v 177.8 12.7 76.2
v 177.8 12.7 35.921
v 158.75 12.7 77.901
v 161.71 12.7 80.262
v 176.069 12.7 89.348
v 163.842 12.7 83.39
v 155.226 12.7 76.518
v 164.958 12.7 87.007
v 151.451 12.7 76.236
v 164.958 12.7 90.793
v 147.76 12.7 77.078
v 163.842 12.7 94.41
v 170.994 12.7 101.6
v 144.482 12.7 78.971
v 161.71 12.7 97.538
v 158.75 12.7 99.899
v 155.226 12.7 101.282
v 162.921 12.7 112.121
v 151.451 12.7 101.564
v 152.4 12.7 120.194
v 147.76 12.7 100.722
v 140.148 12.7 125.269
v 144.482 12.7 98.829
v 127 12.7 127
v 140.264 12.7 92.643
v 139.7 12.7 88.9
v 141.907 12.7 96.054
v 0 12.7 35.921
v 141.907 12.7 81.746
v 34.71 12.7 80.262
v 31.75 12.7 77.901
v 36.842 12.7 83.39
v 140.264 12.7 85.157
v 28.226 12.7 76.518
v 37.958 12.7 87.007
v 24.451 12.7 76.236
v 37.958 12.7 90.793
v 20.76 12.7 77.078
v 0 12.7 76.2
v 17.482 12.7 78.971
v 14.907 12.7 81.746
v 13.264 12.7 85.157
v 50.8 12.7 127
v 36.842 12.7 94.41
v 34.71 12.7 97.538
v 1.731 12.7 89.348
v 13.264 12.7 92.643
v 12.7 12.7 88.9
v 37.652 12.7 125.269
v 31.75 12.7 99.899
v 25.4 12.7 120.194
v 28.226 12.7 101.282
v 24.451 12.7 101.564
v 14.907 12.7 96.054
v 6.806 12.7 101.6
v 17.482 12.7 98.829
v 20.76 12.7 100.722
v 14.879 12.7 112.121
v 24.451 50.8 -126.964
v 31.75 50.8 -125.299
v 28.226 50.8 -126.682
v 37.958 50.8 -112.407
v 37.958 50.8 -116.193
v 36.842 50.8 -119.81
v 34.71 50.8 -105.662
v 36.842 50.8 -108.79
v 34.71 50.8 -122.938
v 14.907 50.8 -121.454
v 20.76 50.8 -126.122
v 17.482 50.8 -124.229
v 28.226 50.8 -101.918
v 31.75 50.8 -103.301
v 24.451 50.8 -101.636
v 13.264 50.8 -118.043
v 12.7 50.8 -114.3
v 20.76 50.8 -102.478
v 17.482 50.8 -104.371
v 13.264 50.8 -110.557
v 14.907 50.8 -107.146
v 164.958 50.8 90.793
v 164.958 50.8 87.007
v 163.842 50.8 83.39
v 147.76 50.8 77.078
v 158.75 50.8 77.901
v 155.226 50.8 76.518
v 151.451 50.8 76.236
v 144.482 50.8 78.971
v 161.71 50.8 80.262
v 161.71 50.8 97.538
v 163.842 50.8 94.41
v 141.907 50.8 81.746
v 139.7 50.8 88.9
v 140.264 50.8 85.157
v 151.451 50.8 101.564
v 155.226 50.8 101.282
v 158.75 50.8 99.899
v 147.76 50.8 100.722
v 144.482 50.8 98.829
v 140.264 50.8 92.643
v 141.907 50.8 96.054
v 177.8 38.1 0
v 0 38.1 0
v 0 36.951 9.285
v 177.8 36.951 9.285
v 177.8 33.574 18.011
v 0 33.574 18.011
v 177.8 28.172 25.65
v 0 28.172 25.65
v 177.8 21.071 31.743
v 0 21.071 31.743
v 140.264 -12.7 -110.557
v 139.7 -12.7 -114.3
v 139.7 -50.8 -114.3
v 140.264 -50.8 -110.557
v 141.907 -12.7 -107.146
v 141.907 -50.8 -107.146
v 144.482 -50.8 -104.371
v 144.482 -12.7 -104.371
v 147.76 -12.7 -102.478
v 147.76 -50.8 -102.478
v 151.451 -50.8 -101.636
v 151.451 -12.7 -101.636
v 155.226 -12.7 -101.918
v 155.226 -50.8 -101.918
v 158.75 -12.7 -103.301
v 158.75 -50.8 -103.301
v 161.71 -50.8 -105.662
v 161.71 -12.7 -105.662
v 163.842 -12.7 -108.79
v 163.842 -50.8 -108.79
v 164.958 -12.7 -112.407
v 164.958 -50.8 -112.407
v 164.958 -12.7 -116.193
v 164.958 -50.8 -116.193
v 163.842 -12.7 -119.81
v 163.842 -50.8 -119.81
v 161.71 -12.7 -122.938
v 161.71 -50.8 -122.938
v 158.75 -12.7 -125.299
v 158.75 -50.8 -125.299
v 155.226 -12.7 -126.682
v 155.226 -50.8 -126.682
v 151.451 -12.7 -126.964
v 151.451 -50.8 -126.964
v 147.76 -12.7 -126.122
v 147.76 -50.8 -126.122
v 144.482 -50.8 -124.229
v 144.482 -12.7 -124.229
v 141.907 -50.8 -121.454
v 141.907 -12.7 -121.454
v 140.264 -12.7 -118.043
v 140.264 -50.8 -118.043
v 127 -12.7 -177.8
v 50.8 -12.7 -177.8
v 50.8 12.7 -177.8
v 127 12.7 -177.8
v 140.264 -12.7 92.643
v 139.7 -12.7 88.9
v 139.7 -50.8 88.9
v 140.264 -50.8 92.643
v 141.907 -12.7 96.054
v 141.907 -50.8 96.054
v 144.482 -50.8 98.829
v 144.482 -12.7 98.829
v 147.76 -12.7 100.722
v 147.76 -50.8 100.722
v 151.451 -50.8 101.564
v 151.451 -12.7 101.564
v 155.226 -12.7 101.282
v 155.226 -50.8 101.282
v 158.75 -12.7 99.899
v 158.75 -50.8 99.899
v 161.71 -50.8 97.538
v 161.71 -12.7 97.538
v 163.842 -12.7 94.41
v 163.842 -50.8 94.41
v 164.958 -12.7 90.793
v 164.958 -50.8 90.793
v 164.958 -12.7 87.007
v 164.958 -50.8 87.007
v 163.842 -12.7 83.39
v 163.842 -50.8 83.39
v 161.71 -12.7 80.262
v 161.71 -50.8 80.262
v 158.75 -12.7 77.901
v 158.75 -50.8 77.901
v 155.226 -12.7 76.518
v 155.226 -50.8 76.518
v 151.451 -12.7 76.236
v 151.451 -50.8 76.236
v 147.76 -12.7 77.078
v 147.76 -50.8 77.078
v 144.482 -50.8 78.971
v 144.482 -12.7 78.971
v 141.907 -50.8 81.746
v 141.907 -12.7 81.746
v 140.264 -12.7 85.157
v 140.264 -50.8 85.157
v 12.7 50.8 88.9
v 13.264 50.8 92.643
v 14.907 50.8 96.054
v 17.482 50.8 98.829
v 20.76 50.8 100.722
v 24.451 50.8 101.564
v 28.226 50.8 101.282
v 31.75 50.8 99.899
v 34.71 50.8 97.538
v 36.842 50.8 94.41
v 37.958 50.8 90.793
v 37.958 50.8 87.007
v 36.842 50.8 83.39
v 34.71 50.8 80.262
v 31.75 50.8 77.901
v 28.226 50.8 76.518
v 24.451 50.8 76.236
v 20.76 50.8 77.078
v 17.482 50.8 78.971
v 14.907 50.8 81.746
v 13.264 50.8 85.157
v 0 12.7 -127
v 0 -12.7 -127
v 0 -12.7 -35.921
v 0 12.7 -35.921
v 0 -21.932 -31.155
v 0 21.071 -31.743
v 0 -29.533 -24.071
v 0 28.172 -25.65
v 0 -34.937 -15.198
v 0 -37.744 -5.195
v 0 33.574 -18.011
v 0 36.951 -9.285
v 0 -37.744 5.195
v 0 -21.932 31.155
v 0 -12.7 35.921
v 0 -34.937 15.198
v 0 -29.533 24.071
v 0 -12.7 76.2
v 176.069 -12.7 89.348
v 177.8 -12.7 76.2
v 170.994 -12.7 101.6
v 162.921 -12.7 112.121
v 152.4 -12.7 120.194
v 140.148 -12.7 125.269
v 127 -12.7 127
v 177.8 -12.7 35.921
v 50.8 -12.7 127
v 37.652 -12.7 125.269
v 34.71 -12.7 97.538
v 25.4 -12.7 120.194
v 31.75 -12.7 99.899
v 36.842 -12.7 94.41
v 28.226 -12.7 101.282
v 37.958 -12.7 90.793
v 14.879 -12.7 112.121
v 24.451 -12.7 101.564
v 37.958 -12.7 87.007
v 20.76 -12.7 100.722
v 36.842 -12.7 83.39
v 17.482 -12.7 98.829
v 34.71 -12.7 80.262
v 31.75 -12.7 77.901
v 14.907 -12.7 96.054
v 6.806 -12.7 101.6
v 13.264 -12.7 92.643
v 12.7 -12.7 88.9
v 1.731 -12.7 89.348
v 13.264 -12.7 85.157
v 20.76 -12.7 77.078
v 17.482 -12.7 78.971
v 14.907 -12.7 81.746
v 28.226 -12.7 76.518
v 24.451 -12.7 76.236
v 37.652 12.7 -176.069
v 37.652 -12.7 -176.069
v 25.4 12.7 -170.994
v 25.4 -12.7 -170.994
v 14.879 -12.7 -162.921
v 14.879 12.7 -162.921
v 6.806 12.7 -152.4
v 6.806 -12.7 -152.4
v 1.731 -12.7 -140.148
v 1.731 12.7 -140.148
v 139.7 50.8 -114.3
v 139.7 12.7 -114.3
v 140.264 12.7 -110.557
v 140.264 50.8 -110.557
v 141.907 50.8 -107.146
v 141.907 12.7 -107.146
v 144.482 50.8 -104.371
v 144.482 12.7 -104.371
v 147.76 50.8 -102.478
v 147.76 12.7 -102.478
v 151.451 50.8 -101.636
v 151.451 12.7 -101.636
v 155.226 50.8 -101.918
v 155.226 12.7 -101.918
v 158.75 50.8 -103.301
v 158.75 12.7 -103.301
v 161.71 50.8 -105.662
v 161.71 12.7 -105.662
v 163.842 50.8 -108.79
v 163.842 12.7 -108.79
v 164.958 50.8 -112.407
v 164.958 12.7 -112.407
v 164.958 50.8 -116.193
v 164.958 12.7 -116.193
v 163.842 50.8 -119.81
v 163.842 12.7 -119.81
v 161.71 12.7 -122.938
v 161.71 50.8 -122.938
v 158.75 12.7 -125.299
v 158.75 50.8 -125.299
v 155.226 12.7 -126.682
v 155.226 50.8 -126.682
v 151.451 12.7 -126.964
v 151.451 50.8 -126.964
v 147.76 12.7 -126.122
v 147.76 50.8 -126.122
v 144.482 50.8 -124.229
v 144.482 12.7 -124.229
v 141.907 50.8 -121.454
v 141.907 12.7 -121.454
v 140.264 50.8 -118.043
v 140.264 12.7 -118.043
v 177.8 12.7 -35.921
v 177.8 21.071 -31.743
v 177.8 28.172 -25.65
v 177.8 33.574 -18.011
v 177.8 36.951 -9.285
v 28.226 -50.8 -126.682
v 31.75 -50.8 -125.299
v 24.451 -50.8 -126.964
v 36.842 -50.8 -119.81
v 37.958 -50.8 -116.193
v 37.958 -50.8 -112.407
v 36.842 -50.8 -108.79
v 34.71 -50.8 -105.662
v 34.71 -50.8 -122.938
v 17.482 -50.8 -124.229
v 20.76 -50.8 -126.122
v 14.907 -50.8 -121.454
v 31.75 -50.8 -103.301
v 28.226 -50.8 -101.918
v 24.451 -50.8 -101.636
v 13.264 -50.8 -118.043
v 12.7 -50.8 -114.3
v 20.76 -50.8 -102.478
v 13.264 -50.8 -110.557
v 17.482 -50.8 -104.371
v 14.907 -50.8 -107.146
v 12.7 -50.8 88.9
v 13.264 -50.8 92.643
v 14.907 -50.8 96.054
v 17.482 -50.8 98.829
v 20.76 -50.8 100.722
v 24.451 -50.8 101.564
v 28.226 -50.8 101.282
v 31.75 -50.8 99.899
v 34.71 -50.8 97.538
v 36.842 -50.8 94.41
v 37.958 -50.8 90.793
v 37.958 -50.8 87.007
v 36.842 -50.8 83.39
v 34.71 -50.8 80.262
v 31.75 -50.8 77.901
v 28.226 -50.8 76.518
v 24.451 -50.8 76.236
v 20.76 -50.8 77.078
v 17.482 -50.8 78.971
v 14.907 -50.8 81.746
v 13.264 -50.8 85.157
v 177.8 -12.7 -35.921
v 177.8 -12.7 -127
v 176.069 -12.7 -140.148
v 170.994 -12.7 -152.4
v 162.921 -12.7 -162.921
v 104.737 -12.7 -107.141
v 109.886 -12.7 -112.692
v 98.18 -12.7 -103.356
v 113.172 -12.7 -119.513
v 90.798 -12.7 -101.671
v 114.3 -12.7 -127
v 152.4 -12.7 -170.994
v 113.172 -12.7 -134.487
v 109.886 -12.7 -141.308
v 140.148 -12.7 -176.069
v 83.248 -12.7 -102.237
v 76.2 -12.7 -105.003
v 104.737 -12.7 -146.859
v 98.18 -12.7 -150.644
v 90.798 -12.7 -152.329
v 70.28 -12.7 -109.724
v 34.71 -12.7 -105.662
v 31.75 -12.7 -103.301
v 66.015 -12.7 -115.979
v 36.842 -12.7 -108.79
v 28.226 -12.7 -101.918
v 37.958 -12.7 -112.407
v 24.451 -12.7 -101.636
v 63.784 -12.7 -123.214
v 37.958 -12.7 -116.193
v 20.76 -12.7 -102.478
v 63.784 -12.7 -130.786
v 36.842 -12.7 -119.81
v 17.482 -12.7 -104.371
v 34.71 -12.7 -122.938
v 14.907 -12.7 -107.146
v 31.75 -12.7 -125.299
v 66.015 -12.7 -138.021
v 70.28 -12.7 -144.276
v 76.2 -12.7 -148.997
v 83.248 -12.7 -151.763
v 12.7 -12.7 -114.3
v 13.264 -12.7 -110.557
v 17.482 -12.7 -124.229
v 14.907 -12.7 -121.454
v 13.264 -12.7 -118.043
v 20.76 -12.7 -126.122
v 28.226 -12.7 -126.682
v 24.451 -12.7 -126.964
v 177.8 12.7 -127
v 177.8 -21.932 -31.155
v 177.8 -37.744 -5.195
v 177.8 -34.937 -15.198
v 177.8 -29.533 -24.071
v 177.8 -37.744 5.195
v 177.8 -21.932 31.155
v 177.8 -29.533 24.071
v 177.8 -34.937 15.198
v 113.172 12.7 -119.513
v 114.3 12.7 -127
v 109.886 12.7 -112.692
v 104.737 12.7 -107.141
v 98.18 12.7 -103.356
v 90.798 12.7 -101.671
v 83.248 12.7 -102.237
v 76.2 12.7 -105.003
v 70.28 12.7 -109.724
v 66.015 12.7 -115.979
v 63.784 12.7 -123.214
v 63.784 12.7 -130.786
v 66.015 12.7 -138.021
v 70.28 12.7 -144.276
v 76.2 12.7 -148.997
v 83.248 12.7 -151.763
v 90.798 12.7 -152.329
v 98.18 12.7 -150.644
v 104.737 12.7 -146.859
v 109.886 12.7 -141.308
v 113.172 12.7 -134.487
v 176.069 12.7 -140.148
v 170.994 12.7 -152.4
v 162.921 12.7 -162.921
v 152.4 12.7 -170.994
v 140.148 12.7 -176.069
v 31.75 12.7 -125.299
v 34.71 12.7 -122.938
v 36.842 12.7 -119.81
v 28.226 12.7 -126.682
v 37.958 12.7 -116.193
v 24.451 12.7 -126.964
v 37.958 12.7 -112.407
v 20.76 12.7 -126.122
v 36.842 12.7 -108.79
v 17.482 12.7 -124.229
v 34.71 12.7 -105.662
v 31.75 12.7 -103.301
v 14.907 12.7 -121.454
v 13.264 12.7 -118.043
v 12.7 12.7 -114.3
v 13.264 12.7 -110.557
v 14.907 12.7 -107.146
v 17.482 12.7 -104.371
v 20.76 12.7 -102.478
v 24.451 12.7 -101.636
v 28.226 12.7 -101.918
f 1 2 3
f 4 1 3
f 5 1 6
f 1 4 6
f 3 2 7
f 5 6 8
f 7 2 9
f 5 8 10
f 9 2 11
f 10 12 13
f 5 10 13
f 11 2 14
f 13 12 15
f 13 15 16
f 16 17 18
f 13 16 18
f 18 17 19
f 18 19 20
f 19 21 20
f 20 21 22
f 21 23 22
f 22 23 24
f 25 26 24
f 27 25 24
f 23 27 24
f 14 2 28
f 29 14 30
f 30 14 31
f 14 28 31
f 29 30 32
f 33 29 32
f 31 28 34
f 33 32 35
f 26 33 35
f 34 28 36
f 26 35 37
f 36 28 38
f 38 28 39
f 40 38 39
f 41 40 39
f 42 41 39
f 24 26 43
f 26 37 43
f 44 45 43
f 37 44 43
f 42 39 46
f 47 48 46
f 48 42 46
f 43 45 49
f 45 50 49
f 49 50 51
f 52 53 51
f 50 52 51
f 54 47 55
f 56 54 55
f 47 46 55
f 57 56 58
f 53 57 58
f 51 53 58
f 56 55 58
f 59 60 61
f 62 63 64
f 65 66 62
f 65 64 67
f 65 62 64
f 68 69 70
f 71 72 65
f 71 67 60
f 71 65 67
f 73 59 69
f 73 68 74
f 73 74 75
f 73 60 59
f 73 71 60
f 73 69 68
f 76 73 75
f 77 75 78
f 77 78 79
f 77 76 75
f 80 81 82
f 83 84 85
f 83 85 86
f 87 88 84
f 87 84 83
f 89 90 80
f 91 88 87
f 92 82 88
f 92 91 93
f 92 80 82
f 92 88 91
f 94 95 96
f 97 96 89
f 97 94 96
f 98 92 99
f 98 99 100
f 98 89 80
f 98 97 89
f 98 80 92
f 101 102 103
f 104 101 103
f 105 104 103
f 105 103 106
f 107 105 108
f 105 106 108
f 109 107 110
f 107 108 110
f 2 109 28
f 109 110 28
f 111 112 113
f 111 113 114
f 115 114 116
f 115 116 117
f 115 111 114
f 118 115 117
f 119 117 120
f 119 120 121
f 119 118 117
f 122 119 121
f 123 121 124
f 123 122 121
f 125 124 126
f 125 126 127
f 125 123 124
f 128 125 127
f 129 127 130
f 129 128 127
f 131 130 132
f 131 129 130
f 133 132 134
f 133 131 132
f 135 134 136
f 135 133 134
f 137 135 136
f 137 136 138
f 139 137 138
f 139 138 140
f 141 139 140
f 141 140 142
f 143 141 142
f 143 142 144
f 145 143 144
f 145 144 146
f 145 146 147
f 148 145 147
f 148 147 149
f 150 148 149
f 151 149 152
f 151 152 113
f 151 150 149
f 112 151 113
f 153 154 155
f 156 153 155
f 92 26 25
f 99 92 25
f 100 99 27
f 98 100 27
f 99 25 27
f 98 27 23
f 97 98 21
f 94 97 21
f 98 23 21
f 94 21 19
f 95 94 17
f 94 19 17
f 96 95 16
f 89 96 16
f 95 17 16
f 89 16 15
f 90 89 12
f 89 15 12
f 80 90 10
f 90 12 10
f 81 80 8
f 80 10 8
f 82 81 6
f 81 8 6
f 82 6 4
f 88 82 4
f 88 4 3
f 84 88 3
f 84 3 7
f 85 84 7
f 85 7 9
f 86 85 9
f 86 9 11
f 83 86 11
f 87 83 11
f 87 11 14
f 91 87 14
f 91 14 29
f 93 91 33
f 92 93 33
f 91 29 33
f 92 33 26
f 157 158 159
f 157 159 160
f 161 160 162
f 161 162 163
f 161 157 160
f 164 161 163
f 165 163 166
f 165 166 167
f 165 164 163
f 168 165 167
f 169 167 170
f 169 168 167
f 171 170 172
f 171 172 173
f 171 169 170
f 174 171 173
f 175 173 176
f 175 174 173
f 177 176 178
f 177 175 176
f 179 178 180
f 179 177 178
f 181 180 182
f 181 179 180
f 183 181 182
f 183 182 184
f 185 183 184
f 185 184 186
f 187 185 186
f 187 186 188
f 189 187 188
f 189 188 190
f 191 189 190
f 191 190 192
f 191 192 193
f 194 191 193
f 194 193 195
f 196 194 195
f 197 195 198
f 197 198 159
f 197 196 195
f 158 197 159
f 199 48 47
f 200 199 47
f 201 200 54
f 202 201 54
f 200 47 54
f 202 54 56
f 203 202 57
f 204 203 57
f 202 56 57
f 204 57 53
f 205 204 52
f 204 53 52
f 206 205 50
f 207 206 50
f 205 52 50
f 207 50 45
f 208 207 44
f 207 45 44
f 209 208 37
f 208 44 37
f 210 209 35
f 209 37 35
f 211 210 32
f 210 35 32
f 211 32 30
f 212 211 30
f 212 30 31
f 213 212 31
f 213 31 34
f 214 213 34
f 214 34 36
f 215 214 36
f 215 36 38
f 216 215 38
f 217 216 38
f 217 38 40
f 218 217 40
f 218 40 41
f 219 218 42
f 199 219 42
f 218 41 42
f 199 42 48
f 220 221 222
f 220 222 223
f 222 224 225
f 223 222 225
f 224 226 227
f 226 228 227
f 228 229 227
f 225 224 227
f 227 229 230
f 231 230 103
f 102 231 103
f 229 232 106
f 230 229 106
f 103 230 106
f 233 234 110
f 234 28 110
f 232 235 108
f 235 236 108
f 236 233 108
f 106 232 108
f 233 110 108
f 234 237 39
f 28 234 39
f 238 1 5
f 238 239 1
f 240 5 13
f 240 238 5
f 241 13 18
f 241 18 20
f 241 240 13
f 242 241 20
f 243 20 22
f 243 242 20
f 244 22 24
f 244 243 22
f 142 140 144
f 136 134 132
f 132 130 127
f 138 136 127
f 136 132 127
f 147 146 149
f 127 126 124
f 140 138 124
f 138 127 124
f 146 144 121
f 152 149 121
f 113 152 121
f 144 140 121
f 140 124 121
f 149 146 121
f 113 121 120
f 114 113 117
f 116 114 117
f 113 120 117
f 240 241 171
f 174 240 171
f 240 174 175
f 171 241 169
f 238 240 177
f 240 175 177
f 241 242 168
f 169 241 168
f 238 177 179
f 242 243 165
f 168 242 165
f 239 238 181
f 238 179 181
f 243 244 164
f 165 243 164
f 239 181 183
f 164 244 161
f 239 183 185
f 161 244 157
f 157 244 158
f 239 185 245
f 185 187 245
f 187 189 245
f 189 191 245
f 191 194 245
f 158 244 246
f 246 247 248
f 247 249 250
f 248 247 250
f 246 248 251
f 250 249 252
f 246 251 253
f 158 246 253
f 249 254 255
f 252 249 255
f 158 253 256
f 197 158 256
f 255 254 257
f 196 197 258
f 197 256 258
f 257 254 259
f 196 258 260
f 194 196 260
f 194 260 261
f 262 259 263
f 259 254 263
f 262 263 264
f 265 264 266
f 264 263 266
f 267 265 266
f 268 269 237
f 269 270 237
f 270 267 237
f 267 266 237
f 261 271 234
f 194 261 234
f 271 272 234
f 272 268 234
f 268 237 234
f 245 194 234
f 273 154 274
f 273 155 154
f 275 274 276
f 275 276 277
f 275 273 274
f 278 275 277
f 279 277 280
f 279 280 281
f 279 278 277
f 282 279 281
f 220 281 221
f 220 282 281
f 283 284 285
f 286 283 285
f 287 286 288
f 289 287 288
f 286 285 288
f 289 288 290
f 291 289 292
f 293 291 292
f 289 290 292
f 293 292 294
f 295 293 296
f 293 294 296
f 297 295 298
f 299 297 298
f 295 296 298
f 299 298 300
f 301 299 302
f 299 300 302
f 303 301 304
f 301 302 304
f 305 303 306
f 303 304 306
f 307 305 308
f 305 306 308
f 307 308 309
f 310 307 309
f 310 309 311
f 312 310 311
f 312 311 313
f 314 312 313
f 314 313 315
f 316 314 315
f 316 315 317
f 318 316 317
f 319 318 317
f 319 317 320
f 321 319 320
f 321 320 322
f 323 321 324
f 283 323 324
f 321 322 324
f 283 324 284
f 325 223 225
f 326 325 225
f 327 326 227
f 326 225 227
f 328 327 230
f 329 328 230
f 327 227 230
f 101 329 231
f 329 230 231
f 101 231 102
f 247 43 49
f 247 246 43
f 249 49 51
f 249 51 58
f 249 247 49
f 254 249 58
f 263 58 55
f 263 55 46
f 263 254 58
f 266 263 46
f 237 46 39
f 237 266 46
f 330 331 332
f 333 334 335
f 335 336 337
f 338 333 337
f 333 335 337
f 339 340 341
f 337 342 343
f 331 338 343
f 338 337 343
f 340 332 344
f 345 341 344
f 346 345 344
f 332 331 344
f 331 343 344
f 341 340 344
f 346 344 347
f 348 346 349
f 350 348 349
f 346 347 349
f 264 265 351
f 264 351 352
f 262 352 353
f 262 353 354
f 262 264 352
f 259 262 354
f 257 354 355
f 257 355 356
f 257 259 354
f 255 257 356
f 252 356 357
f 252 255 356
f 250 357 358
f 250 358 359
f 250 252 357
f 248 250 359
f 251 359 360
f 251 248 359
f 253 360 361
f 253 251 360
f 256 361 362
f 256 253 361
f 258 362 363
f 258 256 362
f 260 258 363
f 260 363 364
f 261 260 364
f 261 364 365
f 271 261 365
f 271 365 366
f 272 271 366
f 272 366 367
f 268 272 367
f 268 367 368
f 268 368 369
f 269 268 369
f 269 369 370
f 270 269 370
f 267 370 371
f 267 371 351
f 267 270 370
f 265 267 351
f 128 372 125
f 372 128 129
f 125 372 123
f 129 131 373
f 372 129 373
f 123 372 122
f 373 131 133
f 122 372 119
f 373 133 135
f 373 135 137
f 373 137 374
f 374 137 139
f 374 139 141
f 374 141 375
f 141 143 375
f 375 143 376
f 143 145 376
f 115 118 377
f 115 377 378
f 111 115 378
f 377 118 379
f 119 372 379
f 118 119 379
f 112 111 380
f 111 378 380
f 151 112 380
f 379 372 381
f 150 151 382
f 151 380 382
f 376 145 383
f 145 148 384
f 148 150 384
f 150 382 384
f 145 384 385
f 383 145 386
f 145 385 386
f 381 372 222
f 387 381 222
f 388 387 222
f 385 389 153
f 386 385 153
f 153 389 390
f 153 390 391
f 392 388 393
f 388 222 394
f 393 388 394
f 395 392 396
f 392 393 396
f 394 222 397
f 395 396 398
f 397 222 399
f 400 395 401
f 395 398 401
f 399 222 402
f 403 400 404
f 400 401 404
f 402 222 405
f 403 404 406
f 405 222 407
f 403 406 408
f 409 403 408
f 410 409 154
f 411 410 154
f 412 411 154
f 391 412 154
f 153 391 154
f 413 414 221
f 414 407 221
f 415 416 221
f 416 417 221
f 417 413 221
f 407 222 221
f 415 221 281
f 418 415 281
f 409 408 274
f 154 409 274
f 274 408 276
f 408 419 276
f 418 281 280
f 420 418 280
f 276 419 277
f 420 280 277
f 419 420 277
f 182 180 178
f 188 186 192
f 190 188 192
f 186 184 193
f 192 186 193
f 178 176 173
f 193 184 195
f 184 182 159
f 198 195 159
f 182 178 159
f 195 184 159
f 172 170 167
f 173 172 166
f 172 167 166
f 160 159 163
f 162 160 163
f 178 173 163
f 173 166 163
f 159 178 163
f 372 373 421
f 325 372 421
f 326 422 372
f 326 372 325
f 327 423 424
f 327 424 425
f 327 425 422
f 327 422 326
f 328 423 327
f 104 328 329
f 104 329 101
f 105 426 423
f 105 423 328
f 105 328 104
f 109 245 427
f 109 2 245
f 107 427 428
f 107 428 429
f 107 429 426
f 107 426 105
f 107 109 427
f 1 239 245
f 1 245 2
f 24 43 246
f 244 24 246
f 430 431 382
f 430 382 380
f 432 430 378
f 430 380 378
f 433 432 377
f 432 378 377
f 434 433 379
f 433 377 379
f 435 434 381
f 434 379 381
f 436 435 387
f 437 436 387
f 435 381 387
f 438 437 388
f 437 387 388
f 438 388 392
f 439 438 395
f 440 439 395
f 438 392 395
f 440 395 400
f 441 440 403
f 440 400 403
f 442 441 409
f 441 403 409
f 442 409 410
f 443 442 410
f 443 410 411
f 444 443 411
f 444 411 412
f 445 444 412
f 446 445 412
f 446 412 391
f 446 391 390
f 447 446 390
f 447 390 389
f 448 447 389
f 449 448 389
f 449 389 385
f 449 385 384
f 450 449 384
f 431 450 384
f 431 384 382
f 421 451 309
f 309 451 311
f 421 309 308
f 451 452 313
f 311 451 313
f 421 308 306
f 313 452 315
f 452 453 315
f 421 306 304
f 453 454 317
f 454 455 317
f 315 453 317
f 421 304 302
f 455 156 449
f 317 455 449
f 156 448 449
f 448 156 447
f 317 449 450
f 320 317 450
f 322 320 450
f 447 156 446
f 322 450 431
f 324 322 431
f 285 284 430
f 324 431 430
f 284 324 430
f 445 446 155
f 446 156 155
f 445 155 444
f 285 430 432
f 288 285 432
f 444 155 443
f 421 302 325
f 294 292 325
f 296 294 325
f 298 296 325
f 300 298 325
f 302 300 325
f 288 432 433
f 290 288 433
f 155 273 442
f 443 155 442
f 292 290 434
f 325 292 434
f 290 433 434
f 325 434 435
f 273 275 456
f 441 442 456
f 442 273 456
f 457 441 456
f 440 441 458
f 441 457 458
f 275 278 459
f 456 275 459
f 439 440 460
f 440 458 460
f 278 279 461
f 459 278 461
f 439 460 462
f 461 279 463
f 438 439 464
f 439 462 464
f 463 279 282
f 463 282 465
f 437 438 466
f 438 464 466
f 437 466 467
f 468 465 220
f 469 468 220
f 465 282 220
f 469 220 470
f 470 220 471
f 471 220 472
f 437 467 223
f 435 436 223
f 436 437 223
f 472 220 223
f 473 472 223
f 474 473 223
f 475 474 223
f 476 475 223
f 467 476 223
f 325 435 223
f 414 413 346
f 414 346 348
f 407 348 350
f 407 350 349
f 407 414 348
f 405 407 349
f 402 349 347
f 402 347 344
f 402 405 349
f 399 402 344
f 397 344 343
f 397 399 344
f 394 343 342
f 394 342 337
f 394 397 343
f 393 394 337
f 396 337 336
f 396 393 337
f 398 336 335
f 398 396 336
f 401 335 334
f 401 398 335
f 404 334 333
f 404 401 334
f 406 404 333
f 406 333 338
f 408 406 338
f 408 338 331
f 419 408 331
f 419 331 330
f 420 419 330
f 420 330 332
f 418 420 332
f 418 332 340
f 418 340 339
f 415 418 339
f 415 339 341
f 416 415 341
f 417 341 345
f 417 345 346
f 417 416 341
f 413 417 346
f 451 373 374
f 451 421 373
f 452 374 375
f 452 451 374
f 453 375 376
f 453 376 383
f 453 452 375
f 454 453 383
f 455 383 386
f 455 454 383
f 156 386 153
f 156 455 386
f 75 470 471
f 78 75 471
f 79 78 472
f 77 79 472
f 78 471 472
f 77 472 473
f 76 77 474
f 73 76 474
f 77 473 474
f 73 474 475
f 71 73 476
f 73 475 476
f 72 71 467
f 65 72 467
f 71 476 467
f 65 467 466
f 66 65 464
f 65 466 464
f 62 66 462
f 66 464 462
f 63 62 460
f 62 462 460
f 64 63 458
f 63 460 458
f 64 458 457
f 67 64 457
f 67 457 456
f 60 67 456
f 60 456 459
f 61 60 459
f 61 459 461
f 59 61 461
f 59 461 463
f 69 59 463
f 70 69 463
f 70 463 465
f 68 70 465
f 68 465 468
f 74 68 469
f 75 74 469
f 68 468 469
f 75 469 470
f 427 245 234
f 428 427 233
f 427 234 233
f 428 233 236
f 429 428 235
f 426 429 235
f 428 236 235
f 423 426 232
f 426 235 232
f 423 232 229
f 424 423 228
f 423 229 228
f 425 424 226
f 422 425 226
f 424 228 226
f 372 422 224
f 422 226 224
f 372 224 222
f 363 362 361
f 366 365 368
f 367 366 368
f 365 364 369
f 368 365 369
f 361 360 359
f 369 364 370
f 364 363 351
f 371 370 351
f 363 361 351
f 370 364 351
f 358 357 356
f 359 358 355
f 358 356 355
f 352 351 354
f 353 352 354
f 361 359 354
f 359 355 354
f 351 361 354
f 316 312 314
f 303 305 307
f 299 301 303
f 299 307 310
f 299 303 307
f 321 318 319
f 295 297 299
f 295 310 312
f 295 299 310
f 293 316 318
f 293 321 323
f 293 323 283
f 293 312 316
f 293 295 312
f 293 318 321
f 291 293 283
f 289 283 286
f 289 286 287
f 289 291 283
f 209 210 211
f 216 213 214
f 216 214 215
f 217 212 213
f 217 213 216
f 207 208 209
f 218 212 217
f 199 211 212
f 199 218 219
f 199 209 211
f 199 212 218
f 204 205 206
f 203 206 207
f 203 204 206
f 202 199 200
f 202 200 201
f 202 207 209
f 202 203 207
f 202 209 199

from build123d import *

# Parameters (mm, degrees)
F0_W     = 25.4
F0_H     = 50.8
F1_DEPTH = 177.8
F2_R     = 12.7
F3_DEPTH = 38.1
F5_R     = 50.8
F7_D     = 50.8
F8_R     = 50.8


with BuildPart() as f1:
    # F0 (on Right) → F1 (new body)
    with BuildSketch(Plane.YZ):
        with BuildLine():
            ThreePointArc((12.7, -35.9210244843), (31.1085197333, -21.9970452561), (38.1, 0))
            ThreePointArc((38.1, 0), (31.1085197333, 21.9970452561), (12.7, 35.9210244843))
            Line((12.7, 35.9210244843), (12.7, -35.9210244843))
        make_face()
        with BuildLine():
            Line((12.7, -35.9210244843), (12.7, 35.9210244843))
            ThreePointArc((12.7, 35.9210244843), (0, 38.1), (-12.7, 35.9210244843))
            Line((-12.7, 35.9210244843), (-12.7, -35.9210244843))
            ThreePointArc((-12.7, -35.9210244843), (0, -38.1), (12.7, -35.9210244843))
        make_face()
        with BuildLine():
            ThreePointArc((-12.7, 35.9210244843), (0, 38.1), (12.7, 35.9210244843))
            Line((12.7, 35.9210244843), (12.7, 127))
            Line((12.7, 127), (-12.7, 127))
            Line((-12.7, 127), (-12.7, 35.9210244843))
        make_face()
        with BuildLine():
            Line((12.7, -127), (12.7, -35.9210244843))
            ThreePointArc((12.7, -35.9210244843), (0, -38.1), (-12.7, -35.9210244843))
            Line((-12.7, -35.9210244843), (-12.7, -127))
            Line((-12.7, -127), (12.7, -127))
        make_face()
        with BuildLine():
            Line((-12.7, -35.9210244843), (-12.7, 35.9210244843))
            ThreePointArc((-12.7, 35.9210244843), (-38.1, 0), (-12.7, -35.9210244843))
        make_face()
        with Locations((0, -152.4)):
            Rectangle(F0_W, F0_H)
    extrude(amount=F1_DEPTH)

    # F2 (on face) → F3 (join)
    with BuildSketch(Plane(origin=(0, 12.7, 0), x_dir=(-1, 0, 0), z_dir=(0, 1, 0))):
        with Locations((-152.4, 88.9)):
            Circle(F2_R)
        with Locations((-25.4, 88.9)):
            Circle(F2_R)
        with Locations((-25.4, -114.3)):
            Circle(F2_R)
        with Locations((-152.4, -114.3)):
            Circle(F2_R)
    extrude(amount=F3_DEPTH)

    # F4: F1 across plane


with BuildPart() as f1_1:
    add(f1.part)
    add(f1.part.mirror(Plane.XZ))

    # F5
    f5_edges = [f1_1.edges().sort_by_distance(p)[0] for p in [
        (177.8, 0, 127),
        (0, 0, 127),
    ]]
    fillet(f5_edges, radius=F5_R)

    # F7 (through all)
    with Locations(Plane(origin=(0, 12.7, 0), x_dir=(-1, 0, 0), z_dir=(0, 1, 0))):
        with Locations((-88.9, -127)):
            Hole(F7_D / 2)

    # F8
    f8_edges = [f1_1.edges().sort_by_distance(p)[0] for p in [
        (177.8, 0, -177.8),
        (0, 0, -177.8),
    ]]
    fillet(f8_edges, radius=F8_R)


solid = f1_1.part
